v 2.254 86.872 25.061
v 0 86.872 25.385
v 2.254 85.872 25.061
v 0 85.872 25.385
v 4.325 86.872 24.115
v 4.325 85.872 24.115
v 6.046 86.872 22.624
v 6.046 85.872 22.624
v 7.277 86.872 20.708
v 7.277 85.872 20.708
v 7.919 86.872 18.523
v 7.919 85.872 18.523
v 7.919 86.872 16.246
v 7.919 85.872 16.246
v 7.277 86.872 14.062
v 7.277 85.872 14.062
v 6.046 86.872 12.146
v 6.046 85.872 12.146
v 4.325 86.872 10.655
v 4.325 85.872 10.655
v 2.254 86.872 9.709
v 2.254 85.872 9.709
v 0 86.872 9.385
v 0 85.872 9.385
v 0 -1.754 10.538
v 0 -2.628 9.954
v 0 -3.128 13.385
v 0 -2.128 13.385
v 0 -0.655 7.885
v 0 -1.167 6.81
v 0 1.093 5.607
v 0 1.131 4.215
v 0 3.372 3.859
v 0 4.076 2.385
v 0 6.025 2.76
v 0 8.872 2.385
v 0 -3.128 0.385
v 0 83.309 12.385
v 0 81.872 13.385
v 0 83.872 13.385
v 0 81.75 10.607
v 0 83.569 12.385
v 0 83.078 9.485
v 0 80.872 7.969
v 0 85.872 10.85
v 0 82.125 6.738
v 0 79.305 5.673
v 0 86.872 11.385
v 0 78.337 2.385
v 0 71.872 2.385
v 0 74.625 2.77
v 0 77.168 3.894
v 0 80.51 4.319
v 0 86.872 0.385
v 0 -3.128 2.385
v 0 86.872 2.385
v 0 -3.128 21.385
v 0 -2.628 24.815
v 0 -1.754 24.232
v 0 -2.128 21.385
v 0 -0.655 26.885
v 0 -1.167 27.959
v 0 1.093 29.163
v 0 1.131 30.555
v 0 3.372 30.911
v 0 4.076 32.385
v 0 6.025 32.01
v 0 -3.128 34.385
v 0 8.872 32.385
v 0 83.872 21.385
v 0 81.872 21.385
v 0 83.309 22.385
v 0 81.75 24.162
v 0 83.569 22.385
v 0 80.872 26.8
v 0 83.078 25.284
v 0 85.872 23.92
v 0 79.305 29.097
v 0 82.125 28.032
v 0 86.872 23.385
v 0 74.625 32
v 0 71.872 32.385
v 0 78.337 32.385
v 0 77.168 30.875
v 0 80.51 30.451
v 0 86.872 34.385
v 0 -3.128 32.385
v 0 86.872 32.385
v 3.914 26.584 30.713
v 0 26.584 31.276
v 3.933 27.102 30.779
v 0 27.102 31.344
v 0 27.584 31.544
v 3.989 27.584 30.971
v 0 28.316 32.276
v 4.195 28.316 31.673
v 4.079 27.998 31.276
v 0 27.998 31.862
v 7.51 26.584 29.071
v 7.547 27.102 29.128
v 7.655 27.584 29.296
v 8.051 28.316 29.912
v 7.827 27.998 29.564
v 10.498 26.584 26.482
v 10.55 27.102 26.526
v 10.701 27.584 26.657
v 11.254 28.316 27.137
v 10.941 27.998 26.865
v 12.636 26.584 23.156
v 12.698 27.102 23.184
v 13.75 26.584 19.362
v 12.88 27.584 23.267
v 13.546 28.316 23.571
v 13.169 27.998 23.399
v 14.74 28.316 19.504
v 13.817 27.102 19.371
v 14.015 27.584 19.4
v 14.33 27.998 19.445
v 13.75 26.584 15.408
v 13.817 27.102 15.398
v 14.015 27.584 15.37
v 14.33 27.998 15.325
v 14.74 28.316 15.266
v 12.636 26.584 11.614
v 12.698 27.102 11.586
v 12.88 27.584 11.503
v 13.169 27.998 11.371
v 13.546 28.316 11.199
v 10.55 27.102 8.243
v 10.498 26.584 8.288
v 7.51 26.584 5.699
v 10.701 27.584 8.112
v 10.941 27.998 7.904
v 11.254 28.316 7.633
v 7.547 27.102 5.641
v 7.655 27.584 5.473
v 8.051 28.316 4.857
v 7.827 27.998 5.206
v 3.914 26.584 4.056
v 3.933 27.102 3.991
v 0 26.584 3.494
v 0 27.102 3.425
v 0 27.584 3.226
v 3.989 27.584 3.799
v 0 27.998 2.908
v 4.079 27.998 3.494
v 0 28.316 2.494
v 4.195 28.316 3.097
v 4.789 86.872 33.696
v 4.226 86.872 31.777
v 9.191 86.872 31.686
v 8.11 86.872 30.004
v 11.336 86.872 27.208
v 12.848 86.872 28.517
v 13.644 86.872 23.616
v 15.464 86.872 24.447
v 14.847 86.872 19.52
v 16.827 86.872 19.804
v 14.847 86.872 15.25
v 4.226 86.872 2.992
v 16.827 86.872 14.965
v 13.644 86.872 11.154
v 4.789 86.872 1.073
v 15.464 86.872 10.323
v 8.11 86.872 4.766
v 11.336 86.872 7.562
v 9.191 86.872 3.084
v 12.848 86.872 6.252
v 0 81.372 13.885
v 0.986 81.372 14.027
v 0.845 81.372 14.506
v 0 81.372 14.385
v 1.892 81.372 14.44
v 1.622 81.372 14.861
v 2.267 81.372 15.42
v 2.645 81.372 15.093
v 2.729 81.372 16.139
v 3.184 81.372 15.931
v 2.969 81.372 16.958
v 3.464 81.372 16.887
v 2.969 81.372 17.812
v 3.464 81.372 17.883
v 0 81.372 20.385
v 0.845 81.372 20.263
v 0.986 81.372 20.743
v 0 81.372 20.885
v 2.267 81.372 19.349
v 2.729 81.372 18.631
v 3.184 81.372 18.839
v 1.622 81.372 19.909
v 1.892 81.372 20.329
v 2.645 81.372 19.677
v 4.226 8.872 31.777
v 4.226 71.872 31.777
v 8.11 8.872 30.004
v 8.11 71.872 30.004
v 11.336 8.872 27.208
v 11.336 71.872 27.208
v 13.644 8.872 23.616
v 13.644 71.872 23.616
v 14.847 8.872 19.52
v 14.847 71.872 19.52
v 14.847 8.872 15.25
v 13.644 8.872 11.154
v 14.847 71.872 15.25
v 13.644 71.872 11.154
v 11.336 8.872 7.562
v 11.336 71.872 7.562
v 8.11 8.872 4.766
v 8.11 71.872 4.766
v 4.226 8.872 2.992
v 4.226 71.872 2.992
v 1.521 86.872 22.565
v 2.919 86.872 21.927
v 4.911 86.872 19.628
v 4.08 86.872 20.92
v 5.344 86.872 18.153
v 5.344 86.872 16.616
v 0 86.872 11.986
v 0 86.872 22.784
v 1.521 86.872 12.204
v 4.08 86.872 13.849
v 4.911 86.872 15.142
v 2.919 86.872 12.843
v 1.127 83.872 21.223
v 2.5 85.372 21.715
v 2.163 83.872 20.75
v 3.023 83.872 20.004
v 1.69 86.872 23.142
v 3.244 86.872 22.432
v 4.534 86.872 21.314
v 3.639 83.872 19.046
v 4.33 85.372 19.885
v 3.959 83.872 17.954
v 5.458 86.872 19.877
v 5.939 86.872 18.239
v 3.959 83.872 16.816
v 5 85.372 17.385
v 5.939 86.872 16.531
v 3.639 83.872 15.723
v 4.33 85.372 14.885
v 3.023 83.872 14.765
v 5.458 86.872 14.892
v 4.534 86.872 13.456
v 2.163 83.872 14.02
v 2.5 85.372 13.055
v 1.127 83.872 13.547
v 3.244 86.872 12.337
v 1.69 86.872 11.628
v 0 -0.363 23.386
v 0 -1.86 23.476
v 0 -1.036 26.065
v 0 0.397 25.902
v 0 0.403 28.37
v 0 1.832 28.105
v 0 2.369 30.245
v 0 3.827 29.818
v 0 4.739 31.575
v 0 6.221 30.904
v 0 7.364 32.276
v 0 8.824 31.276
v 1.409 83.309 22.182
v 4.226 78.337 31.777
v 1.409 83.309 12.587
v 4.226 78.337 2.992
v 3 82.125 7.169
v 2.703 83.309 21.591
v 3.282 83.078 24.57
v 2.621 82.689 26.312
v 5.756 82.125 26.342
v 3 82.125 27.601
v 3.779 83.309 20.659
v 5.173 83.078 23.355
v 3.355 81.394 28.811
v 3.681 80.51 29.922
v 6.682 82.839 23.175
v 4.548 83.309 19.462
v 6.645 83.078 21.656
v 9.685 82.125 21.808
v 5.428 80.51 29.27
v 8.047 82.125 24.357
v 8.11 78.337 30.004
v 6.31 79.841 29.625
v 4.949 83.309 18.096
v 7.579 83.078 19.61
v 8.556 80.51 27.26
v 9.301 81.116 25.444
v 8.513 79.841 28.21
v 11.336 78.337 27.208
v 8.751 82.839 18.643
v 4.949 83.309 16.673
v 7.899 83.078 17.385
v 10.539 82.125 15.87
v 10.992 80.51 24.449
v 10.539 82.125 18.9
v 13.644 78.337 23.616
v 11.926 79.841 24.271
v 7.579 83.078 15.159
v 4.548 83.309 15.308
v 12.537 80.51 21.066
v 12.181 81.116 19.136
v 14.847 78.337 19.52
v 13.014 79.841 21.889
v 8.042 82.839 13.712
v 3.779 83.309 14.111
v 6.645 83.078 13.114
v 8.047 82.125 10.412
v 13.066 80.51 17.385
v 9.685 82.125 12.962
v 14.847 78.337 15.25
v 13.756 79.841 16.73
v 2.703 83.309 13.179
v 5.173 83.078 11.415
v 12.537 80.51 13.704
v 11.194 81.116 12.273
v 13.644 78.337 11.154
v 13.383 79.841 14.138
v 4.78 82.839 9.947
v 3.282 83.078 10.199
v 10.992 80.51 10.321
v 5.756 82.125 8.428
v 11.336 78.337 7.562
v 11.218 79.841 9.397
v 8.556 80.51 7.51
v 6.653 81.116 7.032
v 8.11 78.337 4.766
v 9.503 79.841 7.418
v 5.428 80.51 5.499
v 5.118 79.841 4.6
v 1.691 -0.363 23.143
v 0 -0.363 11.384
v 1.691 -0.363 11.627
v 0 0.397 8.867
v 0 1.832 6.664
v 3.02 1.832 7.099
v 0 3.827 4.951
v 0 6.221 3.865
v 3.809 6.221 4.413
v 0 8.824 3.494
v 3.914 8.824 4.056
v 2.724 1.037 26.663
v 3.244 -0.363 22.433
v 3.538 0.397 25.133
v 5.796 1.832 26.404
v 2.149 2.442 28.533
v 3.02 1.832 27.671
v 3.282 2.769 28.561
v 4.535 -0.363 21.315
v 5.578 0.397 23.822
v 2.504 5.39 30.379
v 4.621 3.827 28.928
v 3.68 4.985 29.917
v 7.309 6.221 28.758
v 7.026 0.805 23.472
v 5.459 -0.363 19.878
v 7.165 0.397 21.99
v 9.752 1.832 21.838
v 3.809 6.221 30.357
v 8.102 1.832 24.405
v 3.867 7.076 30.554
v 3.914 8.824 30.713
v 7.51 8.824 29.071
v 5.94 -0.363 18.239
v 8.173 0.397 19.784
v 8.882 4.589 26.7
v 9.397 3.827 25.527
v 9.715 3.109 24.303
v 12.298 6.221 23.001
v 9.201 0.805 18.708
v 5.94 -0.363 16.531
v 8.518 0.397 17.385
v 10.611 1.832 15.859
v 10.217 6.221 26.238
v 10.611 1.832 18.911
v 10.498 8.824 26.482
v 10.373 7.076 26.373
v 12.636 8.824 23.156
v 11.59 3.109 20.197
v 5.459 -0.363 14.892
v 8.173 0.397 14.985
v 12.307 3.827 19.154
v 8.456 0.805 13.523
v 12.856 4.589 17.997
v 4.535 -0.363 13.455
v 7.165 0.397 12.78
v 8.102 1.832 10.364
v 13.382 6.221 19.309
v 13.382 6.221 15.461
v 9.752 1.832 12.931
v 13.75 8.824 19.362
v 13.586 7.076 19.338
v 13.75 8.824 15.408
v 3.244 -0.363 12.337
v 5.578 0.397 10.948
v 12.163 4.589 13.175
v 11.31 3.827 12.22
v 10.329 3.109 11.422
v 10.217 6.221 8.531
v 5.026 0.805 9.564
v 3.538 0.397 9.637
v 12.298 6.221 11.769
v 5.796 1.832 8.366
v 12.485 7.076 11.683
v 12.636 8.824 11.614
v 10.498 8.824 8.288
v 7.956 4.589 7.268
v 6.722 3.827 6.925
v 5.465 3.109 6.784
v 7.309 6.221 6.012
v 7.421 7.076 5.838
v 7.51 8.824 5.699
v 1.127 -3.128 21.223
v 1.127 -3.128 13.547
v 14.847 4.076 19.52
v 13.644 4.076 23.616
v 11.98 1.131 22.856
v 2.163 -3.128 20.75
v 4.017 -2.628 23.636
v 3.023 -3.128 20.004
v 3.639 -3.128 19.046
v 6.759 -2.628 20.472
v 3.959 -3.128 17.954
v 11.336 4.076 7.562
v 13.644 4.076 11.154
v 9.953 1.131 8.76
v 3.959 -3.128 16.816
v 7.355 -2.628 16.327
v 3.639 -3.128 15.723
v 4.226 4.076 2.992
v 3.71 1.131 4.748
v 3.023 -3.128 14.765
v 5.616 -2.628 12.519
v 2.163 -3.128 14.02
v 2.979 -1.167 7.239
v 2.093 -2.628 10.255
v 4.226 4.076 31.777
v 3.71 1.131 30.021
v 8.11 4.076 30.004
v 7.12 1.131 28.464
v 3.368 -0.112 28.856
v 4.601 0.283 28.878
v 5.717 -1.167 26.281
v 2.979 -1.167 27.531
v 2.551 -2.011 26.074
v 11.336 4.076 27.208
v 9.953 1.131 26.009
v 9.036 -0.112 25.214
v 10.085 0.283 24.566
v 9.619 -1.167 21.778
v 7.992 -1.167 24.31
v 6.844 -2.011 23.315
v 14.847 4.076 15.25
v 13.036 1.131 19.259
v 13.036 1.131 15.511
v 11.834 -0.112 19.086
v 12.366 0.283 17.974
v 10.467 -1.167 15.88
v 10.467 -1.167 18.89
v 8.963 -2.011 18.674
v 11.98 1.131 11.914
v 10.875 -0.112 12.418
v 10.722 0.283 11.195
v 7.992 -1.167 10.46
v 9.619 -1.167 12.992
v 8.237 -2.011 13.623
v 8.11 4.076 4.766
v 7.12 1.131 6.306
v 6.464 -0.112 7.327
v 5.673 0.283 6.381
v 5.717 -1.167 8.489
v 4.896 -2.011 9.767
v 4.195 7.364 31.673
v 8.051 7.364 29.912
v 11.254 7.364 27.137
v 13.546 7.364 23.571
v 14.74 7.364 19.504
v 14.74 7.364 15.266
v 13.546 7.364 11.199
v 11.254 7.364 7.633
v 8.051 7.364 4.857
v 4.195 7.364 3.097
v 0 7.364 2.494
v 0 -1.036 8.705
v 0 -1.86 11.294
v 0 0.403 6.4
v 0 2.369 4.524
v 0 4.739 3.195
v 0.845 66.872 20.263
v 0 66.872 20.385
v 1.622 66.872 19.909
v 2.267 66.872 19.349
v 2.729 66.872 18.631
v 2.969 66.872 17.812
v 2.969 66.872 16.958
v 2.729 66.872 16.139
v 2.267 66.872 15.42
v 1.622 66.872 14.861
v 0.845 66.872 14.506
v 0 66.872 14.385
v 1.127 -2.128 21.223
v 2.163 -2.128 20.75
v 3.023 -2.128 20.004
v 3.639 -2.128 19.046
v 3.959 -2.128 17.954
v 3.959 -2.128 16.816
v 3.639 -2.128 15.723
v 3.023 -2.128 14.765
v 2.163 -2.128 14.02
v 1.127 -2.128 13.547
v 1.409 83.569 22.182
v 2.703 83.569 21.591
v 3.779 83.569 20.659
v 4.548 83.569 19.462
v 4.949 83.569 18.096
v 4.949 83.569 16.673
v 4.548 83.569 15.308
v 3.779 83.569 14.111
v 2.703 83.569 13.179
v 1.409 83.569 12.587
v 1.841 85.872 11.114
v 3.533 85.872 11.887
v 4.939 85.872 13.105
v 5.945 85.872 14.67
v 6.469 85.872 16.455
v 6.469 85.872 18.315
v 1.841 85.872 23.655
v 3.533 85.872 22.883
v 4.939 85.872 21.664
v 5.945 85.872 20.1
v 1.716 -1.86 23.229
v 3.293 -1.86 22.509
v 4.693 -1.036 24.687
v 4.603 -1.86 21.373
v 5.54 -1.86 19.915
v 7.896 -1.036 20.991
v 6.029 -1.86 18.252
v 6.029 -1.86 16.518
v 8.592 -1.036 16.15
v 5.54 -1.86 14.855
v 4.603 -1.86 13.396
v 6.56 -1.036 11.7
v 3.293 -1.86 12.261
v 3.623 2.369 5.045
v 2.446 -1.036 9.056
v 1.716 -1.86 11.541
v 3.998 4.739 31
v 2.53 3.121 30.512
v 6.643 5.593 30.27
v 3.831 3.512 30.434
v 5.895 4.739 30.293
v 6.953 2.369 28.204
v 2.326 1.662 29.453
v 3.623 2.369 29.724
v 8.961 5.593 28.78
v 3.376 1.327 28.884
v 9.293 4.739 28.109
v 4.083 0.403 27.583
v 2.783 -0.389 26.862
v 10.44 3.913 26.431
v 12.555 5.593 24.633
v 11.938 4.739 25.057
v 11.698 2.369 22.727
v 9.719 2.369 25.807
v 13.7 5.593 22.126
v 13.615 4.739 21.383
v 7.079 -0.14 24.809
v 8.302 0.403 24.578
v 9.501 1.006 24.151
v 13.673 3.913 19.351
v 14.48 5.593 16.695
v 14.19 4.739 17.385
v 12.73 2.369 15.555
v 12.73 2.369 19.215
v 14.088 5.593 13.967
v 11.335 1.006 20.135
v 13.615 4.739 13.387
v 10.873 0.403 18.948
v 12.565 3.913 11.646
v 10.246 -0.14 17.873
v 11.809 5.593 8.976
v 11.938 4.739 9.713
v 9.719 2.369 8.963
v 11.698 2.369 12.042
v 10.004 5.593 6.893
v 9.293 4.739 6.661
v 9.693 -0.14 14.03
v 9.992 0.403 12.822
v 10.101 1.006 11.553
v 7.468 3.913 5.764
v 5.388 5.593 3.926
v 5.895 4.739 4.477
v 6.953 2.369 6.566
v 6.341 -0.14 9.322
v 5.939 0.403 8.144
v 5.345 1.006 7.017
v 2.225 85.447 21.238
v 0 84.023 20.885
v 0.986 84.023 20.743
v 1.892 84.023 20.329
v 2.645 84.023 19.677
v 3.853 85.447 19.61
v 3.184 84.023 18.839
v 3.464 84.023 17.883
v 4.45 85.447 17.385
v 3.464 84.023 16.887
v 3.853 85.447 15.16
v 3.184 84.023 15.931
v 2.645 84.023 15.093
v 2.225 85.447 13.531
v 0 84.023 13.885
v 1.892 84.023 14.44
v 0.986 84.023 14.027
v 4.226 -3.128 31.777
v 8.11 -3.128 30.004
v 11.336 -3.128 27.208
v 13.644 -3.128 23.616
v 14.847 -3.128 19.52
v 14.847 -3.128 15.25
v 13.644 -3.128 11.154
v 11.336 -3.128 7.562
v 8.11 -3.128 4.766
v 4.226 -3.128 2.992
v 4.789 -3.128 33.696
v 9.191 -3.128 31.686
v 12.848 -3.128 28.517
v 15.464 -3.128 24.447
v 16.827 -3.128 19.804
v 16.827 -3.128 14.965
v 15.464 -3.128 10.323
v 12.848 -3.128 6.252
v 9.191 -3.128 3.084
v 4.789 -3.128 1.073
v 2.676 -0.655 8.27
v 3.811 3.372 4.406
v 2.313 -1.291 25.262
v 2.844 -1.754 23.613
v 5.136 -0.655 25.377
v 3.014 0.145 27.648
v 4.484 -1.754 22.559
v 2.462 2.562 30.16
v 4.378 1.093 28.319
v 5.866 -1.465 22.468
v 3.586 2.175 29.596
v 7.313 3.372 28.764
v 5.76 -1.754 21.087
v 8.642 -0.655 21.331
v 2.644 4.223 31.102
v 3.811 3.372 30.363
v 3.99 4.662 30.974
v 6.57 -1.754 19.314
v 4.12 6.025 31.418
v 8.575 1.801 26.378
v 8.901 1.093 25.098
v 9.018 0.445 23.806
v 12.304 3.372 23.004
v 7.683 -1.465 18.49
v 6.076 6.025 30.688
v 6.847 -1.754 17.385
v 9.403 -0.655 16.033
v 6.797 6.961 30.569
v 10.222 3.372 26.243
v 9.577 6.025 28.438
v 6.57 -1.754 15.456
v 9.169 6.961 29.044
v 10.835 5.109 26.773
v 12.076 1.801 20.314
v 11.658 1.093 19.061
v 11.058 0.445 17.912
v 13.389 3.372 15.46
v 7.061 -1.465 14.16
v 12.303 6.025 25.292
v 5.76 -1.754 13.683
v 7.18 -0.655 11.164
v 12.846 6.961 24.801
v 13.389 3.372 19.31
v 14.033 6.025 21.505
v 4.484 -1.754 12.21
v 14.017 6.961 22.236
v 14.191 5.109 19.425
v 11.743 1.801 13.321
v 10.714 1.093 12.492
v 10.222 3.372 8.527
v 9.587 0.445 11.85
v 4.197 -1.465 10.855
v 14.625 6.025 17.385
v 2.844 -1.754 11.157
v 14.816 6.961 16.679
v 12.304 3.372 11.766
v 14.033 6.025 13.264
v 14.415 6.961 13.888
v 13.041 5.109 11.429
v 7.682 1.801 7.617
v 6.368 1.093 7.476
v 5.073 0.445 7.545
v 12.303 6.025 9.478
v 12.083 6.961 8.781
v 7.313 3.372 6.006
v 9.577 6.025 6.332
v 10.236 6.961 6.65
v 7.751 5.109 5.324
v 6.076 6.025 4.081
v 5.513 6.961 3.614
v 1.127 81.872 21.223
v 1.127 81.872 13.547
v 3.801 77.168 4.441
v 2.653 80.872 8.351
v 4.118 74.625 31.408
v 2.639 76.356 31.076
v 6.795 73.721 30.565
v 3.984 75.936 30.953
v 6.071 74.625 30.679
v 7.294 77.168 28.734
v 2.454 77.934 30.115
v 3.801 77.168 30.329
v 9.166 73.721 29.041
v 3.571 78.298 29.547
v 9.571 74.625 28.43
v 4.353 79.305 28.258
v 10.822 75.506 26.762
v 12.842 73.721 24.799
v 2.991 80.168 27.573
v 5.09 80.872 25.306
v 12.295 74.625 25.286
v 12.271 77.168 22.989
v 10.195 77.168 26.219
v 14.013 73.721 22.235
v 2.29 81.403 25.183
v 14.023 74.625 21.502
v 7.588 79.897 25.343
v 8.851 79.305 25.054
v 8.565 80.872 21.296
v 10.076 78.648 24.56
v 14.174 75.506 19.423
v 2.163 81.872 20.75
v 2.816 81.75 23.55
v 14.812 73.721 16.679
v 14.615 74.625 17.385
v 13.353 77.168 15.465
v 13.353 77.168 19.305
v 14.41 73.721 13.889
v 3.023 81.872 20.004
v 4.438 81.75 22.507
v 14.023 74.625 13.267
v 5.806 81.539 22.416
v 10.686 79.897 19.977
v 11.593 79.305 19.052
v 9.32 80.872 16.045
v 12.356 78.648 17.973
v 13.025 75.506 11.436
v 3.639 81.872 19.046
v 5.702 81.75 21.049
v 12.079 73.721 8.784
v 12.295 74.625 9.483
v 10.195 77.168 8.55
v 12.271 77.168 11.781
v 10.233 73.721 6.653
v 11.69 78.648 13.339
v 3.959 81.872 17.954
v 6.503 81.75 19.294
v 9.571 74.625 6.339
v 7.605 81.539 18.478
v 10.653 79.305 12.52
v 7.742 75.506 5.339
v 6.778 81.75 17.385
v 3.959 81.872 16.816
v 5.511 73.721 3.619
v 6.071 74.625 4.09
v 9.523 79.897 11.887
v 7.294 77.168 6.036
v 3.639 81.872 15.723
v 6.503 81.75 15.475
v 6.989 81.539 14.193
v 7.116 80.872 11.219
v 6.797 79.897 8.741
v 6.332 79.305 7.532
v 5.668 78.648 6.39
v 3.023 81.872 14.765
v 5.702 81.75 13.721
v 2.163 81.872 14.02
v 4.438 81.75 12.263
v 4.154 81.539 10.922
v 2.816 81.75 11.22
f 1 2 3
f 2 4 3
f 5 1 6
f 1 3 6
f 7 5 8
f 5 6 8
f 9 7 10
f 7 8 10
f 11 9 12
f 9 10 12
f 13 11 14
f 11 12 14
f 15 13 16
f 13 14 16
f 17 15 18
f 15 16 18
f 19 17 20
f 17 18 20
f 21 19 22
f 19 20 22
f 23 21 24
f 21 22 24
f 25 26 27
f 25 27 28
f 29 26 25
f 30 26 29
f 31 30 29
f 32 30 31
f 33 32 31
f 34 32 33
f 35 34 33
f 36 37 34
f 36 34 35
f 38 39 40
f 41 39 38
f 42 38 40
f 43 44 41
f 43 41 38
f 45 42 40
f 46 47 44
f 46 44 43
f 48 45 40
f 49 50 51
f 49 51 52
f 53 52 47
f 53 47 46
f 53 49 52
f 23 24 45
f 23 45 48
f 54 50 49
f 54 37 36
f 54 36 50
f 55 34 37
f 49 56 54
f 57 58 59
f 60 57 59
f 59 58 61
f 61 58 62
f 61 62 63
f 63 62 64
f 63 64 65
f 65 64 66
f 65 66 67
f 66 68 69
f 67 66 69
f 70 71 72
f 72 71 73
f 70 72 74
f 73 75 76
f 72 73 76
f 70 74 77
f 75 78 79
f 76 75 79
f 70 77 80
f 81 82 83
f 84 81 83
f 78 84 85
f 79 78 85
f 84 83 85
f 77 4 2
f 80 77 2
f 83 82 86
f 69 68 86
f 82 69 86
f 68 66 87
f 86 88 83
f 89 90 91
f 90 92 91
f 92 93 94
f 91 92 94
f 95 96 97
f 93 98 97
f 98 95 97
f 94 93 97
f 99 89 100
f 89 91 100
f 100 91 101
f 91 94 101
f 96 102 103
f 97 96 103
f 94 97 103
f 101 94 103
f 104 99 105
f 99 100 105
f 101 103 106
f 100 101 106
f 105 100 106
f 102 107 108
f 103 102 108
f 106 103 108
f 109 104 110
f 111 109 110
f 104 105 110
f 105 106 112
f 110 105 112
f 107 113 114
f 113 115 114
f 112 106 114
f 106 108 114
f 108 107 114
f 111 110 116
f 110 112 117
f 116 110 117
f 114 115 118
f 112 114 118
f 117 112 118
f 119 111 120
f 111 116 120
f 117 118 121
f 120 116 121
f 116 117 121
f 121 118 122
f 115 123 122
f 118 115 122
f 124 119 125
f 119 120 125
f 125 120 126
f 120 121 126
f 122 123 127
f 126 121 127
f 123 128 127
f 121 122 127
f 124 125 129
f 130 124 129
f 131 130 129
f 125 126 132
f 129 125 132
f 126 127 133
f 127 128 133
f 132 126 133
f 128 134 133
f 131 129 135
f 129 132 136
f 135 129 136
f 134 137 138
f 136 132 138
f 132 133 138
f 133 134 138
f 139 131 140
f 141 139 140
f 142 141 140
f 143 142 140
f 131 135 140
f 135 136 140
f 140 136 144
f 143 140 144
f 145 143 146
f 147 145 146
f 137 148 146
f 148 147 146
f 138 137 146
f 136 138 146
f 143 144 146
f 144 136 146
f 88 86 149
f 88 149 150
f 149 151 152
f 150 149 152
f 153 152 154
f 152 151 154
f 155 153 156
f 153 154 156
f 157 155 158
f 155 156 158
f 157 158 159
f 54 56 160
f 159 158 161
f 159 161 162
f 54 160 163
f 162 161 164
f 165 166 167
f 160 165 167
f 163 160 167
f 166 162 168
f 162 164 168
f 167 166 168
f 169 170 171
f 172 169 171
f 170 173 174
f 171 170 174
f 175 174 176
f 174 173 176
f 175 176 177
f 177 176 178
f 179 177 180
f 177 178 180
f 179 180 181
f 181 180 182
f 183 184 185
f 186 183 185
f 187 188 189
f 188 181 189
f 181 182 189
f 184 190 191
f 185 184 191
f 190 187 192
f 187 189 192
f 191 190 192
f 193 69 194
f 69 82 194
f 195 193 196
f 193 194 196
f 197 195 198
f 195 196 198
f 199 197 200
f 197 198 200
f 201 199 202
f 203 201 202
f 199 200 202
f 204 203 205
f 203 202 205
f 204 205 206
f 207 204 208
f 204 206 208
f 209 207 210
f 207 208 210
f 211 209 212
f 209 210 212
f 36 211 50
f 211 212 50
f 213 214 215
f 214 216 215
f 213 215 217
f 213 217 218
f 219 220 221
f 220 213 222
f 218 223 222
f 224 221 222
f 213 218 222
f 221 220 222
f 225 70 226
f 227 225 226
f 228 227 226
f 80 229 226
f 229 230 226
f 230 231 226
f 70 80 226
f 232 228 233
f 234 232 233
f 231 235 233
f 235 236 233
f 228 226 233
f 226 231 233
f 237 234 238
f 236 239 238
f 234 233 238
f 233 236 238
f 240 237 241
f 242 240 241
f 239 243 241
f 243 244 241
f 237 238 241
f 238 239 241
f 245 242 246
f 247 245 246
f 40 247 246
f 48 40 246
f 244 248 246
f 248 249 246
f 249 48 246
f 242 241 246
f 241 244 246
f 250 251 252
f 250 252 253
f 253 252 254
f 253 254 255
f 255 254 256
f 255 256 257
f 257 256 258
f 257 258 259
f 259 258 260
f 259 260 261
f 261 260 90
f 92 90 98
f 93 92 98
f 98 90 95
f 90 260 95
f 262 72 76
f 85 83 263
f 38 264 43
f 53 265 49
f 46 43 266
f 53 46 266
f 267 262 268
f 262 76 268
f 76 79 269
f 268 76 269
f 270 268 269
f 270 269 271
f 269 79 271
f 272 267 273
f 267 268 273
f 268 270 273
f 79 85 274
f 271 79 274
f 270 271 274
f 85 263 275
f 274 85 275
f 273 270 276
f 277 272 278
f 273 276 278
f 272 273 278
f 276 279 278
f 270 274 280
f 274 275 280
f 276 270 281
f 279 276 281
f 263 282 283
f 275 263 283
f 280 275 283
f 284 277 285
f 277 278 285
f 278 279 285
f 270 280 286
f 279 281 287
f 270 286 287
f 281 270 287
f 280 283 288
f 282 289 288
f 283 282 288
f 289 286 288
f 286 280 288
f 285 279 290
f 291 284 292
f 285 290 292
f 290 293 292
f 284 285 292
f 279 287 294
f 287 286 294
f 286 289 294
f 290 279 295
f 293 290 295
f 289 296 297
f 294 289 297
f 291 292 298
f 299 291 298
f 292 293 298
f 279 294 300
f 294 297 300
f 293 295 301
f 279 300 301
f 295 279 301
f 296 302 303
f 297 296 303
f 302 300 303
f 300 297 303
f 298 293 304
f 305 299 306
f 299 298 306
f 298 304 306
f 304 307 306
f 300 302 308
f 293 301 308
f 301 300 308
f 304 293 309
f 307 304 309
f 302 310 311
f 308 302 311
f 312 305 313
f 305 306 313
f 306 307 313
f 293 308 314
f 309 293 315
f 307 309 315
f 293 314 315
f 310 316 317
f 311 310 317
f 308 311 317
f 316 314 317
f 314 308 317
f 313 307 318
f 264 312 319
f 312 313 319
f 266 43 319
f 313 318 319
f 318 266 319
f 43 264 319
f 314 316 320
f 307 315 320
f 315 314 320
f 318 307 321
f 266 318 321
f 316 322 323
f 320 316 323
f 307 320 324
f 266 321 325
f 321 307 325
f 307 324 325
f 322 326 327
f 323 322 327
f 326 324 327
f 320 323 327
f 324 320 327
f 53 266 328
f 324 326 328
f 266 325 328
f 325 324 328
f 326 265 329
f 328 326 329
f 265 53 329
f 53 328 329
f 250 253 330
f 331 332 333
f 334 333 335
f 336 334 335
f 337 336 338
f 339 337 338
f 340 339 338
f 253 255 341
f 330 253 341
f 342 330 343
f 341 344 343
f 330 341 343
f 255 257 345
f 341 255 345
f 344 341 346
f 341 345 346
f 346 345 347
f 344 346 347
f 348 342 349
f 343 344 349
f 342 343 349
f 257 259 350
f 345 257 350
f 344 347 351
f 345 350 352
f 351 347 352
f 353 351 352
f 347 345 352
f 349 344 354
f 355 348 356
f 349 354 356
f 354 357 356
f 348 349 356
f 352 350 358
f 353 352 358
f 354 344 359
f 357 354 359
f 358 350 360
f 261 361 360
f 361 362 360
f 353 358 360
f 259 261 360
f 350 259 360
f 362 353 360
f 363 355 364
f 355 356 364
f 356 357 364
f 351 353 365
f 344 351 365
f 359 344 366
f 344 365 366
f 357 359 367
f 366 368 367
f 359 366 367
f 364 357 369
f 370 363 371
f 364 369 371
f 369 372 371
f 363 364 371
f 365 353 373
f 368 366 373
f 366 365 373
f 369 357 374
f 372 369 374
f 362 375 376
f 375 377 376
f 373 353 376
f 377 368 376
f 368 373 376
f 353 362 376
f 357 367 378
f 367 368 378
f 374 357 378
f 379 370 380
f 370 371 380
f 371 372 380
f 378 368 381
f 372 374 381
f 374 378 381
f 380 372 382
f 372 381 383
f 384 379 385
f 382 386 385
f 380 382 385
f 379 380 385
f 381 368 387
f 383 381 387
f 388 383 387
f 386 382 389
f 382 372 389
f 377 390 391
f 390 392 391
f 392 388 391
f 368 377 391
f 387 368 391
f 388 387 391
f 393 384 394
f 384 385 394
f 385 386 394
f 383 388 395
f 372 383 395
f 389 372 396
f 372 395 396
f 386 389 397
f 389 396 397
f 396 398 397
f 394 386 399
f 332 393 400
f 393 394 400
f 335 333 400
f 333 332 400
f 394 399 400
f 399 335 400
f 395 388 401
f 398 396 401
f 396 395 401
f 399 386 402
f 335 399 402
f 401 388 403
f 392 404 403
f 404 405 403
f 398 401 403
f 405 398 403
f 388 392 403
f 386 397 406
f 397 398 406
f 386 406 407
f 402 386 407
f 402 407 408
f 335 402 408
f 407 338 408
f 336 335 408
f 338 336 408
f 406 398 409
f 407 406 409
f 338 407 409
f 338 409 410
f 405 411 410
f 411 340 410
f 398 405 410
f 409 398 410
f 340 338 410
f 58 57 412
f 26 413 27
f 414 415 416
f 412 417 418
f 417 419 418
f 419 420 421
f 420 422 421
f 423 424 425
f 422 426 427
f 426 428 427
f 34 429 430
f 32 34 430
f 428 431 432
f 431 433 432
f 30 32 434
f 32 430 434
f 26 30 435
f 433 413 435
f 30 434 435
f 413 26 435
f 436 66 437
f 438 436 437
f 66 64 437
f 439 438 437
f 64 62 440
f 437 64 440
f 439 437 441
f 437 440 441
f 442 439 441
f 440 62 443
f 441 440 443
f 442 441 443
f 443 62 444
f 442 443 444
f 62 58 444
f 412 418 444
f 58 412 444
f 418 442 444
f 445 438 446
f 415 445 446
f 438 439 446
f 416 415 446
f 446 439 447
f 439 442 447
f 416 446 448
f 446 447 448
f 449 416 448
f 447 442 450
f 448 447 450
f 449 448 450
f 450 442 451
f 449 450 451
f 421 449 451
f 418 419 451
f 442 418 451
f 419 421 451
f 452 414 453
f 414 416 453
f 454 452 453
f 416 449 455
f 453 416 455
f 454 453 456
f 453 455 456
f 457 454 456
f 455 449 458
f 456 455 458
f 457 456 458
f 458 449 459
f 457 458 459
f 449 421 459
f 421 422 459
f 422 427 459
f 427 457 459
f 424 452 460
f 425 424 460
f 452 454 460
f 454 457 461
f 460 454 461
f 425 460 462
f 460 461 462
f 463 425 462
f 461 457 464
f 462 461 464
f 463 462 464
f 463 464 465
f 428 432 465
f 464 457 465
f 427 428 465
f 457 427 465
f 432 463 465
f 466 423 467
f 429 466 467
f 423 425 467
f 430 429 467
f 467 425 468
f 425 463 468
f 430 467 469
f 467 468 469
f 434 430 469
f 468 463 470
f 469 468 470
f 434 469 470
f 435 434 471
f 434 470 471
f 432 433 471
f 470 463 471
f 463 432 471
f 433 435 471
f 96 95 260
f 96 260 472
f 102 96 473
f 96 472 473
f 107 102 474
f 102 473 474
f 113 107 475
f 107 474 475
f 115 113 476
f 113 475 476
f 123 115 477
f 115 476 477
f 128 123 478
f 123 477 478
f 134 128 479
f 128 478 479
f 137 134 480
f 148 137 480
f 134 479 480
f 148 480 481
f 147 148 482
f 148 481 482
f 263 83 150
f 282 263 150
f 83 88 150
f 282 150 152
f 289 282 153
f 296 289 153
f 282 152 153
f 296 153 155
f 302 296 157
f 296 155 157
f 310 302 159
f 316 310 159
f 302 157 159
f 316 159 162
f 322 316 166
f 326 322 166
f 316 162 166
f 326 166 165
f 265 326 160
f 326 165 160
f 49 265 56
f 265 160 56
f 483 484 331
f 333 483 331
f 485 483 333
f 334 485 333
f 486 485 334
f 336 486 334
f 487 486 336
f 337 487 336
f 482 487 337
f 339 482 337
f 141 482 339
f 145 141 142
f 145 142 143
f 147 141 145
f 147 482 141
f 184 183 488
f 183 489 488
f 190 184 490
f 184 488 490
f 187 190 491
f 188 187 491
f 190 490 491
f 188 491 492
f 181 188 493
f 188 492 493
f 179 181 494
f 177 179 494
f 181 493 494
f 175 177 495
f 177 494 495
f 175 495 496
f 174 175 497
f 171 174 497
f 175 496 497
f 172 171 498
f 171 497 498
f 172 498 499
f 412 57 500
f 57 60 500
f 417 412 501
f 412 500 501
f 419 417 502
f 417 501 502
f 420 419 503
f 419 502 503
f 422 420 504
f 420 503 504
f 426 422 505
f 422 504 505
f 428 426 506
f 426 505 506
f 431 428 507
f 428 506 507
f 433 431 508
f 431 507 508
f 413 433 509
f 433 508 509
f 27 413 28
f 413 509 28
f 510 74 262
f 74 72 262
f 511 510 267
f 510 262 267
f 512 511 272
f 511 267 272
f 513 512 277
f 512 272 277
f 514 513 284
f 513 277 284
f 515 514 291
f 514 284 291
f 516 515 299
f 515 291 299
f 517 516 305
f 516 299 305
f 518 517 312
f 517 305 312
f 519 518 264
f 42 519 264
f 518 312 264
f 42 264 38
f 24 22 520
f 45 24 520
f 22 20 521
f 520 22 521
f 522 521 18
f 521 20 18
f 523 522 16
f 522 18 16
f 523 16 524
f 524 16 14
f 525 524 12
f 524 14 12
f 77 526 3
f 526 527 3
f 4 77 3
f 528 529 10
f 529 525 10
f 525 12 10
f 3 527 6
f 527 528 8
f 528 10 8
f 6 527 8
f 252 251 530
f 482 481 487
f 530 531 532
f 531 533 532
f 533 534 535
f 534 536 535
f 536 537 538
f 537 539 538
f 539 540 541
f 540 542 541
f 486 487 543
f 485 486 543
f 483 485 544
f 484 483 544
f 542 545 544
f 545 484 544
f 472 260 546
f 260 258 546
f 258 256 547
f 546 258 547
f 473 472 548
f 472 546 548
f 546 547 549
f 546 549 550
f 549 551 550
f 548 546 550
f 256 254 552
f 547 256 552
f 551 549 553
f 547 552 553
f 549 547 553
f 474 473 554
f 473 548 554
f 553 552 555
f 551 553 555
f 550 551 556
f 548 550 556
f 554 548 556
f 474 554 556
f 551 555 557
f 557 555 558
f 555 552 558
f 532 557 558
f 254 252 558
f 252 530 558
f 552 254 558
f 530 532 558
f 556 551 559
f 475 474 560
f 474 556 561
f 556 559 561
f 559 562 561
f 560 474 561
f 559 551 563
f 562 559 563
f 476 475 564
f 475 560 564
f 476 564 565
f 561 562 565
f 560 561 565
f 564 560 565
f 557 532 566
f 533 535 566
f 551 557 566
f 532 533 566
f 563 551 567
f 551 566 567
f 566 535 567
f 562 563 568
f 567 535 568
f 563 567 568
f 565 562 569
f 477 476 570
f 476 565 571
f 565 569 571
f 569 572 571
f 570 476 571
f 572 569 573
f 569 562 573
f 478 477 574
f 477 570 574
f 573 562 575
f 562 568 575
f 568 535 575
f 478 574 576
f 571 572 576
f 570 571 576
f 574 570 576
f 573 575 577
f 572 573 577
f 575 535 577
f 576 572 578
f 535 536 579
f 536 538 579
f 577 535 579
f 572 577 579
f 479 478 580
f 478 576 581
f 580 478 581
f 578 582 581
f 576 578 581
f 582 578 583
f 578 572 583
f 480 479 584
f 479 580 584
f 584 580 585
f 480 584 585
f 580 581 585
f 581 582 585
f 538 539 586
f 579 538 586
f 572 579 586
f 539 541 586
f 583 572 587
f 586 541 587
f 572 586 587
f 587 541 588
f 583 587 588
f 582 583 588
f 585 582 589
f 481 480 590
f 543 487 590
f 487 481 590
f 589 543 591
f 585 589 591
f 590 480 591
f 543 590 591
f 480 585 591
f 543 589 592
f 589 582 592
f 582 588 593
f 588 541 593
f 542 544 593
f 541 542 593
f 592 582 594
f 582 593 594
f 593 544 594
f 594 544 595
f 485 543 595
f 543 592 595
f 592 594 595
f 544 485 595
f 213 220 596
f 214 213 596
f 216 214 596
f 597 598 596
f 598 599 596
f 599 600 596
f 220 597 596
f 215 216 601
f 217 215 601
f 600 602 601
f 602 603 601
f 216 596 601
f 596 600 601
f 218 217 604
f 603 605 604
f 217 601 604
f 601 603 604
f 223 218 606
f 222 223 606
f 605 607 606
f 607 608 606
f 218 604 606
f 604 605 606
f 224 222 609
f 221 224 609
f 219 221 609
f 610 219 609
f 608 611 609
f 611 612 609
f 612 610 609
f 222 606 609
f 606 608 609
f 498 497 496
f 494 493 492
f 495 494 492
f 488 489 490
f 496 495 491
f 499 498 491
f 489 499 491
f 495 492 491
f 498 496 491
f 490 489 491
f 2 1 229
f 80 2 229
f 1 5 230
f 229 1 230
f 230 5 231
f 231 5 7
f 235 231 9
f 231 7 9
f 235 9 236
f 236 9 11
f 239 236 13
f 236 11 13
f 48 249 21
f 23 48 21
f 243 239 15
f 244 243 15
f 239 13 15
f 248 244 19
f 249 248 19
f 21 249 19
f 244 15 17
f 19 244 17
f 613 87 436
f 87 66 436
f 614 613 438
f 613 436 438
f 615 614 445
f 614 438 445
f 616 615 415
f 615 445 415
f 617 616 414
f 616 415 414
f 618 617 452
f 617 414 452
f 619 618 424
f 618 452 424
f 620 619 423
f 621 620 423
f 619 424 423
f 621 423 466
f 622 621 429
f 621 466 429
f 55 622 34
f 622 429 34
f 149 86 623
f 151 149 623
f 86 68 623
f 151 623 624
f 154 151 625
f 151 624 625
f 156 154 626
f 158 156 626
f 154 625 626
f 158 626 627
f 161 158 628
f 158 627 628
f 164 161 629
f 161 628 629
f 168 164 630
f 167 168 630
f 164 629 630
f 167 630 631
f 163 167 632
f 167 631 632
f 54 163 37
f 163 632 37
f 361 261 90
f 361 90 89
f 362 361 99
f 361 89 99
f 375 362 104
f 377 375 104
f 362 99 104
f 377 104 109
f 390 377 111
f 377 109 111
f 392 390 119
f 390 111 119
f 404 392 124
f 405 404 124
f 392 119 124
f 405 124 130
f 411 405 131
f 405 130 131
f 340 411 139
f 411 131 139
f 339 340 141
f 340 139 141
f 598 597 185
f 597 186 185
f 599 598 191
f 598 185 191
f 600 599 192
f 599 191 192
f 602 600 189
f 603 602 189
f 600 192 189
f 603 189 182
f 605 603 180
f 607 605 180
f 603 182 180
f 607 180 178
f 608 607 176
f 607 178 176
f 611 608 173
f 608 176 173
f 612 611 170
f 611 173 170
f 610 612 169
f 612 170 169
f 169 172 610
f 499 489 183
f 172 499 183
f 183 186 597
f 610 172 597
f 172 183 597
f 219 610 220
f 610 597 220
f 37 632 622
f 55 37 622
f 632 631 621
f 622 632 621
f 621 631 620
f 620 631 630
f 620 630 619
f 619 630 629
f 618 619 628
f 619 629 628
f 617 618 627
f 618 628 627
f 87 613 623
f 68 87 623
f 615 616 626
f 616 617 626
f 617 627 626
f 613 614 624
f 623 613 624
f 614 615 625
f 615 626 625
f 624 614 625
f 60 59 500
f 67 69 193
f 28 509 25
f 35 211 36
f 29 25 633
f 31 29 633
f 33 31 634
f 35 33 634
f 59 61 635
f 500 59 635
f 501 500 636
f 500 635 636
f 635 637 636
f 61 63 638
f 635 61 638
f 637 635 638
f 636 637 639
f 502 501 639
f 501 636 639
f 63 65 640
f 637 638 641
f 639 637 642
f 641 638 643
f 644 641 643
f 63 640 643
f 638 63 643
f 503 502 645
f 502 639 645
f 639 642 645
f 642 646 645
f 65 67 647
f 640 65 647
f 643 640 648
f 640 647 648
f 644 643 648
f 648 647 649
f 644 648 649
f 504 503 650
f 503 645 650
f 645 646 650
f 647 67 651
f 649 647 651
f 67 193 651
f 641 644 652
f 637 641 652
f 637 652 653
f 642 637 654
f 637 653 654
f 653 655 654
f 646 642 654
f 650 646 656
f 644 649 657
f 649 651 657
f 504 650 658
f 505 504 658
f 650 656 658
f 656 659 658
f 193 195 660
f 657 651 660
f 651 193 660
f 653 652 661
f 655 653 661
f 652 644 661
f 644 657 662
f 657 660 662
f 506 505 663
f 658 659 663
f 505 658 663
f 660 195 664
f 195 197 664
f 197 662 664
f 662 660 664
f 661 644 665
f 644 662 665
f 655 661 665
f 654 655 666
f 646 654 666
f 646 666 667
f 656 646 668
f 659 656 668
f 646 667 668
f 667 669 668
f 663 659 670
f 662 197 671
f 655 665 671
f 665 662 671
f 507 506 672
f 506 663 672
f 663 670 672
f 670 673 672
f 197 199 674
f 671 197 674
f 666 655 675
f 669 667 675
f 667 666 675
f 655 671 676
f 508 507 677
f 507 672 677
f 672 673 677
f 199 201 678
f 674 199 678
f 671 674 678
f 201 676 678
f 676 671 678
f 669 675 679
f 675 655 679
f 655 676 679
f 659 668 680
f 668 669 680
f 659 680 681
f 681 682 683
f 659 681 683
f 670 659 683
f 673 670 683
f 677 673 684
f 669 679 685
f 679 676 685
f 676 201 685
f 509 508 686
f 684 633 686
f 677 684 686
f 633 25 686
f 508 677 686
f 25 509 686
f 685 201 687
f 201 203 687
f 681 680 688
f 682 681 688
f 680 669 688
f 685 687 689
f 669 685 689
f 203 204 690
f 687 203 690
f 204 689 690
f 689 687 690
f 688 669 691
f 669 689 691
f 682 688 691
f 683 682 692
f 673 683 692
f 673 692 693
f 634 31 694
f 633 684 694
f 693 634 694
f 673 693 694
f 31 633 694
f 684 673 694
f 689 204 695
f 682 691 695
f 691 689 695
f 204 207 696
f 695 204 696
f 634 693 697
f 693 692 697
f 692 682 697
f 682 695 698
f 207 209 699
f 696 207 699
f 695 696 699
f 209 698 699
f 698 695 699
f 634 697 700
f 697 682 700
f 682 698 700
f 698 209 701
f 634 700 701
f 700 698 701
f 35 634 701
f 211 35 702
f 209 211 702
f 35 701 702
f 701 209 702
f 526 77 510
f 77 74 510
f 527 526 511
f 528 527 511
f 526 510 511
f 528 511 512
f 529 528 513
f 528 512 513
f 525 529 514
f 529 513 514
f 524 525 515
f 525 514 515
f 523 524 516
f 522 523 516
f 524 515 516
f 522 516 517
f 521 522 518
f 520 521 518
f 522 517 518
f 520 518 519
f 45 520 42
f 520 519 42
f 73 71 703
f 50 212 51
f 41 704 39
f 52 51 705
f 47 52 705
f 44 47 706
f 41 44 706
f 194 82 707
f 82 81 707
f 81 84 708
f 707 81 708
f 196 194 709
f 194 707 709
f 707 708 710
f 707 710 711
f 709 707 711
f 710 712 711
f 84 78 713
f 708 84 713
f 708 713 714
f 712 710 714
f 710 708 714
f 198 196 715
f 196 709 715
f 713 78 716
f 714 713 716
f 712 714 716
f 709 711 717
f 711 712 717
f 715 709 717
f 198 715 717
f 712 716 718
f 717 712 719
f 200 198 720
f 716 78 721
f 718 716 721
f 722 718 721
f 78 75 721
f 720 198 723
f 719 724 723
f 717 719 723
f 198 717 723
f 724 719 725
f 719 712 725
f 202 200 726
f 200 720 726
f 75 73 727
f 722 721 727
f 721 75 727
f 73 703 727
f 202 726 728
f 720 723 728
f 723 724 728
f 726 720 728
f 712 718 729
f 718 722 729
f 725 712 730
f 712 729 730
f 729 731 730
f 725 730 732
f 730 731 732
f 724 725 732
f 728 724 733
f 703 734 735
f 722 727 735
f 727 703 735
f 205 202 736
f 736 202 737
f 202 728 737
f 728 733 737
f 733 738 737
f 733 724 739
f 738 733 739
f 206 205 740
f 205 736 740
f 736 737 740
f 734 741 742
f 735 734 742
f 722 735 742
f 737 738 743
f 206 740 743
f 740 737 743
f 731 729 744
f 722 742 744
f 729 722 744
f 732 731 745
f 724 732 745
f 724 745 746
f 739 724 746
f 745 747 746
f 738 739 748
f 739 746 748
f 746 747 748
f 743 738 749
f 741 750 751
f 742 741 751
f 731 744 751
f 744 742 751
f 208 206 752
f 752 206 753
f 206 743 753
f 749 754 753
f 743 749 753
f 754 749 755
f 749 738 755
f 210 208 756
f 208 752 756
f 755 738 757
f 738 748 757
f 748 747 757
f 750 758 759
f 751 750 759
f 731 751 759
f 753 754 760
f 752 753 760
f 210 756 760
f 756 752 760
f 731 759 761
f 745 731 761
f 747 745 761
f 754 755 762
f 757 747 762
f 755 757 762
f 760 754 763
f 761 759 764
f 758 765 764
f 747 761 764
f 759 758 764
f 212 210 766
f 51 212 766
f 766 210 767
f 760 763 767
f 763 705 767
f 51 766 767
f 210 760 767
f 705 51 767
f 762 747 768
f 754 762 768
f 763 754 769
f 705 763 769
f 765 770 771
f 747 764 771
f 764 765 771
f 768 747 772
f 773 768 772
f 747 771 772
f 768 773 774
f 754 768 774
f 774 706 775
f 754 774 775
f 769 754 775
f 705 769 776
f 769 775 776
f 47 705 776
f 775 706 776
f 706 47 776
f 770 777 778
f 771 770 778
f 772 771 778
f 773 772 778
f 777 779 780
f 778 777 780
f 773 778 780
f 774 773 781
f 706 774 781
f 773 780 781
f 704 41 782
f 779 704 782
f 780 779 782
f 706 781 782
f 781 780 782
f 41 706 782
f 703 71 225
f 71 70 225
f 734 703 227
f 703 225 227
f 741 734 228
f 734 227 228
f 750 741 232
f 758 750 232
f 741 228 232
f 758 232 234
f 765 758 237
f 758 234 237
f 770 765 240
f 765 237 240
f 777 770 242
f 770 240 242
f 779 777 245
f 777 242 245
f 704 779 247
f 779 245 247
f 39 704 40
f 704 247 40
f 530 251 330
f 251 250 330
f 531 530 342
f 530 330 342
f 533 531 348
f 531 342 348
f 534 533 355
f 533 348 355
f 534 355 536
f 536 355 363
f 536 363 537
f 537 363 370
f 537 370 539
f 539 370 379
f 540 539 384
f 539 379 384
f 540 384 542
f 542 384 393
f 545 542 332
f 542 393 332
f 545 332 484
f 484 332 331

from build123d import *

# Parameters (mm, degrees)
F1_ANGLE = 180
F3_ANGLE = 180
F5_ANGLE = 180


# Not quite as in the source:
# - a feature names something its author has since deleted; it is built from what else it names


with BuildPart() as f1:
    # F0 (on Right) → F1 (revolve)
    with BuildSketch(Plane.YZ):
        with BuildLine():
            Line((86.8716222048, 34.384835436), (-3.1283777952, 34.384835436))
            Line((-3.1283777952, 34.384835436), (-3.1283777952, 32.384835436))
            Line((-3.1283777952, 32.384835436), (4.0757906815, 32.384835436))
            ThreePointArc((4.0757906815, 32.384835436), (-1.1670524657, 27.9594084914), (-3.1283777952, 21.384835436))
            Line((-3.1283777952, 21.384835436), (-2.1283777952, 21.384835436))
            ThreePointArc((-2.1283777952, 21.384835436), (1.0934476117, 29.1630100291), (8.8716222048, 32.384835436))
            Line((8.8716222048, 32.384835436), (71.8716222048, 32.384835436))
            ThreePointArc((71.8716222048, 32.384835436), (79.3046565784, 29.0966848666), (81.8716222048, 21.384835436))
            Line((81.8716222048, 21.384835436), (83.8716222048, 21.384835436))
            Line((83.8716222048, 21.384835436), (86.8716222048, 23.384835436))
            Line((86.8716222048, 23.384835436), (86.8716222048, 25.384835436))
            Line((86.8716222048, 25.384835436), (85.8716222048, 25.384835436))
            Line((85.8716222048, 25.384835436), (85.8716222048, 23.9200191945))
            Line((85.8716222048, 23.9200191945), (83.568846567, 22.384835436))
            Line((83.568846567, 22.384835436), (83.308739016, 22.384835436))
            ThreePointArc((83.308739016, 22.384835436), (82.1246676761, 28.0320507224), (78.337012641, 32.384835436))
            Line((78.337012641, 32.384835436), (86.8716222048, 32.384835436))
            Line((86.8716222048, 32.384835436), (86.8716222048, 34.384835436))
        make_face()
    revolve(axis=Axis((0, 40.3716222048, 17.384835436), (0, 1, 0)), revolution_arc=F1_ANGLE)


with BuildPart() as f3:
    # F2 (on Right) → F3 (revolve)
    with BuildSketch(Plane.YZ):
        with BuildLine():
            ThreePointArc((26.5840469152, 31.2761664331), (27.5840469152, 31.5441156255), (28.3160977227, 32.2761664331))
            Line((28.3160977227, 32.2761664331), (7.3641507709, 32.2761664331))
            ThreePointArc((7.3641507709, 32.2761664331), (1.3274941354, 29.3690617963), (-1.8600750098, 23.4756855441))
            Line((-1.8600750098, 23.4756855441), (-0.3631143027, 23.385647569))
            ThreePointArc((-0.3631143027, 23.385647569), (2.7686641904, 29.0327619647), (8.8238333804, 31.2761664331))
            Line((8.8238333804, 31.2761664331), (26.5840469152, 31.2761664331))
        make_face()
    revolve(axis=Axis((0, 40.3716222048, 17.384835436), (0, 1, 0)), revolution_arc=F3_ANGLE)


with BuildPart() as f5:
    # F4 (on Right) → F5 (revolve)
    with BuildSketch(Plane.YZ):
        Polygon((86.8716222048, 17.384835436), (86.8716222048, 22.7839102235), (84.0230100236, 20.884835436), (81.3716222048, 20.884835436), (81.3716222048, 20.384835436), (66.8716222048, 20.384835436), (66.8716222048, 17.384835436), (71.8716222048, 17.384835436), align=None)
    revolve(axis=Axis((0, 40.3716222048, 17.384835436), (0, 1, 0)), revolution_arc=F5_ANGLE)


solid = Compound([f1.part, f3.part, f5.part])
